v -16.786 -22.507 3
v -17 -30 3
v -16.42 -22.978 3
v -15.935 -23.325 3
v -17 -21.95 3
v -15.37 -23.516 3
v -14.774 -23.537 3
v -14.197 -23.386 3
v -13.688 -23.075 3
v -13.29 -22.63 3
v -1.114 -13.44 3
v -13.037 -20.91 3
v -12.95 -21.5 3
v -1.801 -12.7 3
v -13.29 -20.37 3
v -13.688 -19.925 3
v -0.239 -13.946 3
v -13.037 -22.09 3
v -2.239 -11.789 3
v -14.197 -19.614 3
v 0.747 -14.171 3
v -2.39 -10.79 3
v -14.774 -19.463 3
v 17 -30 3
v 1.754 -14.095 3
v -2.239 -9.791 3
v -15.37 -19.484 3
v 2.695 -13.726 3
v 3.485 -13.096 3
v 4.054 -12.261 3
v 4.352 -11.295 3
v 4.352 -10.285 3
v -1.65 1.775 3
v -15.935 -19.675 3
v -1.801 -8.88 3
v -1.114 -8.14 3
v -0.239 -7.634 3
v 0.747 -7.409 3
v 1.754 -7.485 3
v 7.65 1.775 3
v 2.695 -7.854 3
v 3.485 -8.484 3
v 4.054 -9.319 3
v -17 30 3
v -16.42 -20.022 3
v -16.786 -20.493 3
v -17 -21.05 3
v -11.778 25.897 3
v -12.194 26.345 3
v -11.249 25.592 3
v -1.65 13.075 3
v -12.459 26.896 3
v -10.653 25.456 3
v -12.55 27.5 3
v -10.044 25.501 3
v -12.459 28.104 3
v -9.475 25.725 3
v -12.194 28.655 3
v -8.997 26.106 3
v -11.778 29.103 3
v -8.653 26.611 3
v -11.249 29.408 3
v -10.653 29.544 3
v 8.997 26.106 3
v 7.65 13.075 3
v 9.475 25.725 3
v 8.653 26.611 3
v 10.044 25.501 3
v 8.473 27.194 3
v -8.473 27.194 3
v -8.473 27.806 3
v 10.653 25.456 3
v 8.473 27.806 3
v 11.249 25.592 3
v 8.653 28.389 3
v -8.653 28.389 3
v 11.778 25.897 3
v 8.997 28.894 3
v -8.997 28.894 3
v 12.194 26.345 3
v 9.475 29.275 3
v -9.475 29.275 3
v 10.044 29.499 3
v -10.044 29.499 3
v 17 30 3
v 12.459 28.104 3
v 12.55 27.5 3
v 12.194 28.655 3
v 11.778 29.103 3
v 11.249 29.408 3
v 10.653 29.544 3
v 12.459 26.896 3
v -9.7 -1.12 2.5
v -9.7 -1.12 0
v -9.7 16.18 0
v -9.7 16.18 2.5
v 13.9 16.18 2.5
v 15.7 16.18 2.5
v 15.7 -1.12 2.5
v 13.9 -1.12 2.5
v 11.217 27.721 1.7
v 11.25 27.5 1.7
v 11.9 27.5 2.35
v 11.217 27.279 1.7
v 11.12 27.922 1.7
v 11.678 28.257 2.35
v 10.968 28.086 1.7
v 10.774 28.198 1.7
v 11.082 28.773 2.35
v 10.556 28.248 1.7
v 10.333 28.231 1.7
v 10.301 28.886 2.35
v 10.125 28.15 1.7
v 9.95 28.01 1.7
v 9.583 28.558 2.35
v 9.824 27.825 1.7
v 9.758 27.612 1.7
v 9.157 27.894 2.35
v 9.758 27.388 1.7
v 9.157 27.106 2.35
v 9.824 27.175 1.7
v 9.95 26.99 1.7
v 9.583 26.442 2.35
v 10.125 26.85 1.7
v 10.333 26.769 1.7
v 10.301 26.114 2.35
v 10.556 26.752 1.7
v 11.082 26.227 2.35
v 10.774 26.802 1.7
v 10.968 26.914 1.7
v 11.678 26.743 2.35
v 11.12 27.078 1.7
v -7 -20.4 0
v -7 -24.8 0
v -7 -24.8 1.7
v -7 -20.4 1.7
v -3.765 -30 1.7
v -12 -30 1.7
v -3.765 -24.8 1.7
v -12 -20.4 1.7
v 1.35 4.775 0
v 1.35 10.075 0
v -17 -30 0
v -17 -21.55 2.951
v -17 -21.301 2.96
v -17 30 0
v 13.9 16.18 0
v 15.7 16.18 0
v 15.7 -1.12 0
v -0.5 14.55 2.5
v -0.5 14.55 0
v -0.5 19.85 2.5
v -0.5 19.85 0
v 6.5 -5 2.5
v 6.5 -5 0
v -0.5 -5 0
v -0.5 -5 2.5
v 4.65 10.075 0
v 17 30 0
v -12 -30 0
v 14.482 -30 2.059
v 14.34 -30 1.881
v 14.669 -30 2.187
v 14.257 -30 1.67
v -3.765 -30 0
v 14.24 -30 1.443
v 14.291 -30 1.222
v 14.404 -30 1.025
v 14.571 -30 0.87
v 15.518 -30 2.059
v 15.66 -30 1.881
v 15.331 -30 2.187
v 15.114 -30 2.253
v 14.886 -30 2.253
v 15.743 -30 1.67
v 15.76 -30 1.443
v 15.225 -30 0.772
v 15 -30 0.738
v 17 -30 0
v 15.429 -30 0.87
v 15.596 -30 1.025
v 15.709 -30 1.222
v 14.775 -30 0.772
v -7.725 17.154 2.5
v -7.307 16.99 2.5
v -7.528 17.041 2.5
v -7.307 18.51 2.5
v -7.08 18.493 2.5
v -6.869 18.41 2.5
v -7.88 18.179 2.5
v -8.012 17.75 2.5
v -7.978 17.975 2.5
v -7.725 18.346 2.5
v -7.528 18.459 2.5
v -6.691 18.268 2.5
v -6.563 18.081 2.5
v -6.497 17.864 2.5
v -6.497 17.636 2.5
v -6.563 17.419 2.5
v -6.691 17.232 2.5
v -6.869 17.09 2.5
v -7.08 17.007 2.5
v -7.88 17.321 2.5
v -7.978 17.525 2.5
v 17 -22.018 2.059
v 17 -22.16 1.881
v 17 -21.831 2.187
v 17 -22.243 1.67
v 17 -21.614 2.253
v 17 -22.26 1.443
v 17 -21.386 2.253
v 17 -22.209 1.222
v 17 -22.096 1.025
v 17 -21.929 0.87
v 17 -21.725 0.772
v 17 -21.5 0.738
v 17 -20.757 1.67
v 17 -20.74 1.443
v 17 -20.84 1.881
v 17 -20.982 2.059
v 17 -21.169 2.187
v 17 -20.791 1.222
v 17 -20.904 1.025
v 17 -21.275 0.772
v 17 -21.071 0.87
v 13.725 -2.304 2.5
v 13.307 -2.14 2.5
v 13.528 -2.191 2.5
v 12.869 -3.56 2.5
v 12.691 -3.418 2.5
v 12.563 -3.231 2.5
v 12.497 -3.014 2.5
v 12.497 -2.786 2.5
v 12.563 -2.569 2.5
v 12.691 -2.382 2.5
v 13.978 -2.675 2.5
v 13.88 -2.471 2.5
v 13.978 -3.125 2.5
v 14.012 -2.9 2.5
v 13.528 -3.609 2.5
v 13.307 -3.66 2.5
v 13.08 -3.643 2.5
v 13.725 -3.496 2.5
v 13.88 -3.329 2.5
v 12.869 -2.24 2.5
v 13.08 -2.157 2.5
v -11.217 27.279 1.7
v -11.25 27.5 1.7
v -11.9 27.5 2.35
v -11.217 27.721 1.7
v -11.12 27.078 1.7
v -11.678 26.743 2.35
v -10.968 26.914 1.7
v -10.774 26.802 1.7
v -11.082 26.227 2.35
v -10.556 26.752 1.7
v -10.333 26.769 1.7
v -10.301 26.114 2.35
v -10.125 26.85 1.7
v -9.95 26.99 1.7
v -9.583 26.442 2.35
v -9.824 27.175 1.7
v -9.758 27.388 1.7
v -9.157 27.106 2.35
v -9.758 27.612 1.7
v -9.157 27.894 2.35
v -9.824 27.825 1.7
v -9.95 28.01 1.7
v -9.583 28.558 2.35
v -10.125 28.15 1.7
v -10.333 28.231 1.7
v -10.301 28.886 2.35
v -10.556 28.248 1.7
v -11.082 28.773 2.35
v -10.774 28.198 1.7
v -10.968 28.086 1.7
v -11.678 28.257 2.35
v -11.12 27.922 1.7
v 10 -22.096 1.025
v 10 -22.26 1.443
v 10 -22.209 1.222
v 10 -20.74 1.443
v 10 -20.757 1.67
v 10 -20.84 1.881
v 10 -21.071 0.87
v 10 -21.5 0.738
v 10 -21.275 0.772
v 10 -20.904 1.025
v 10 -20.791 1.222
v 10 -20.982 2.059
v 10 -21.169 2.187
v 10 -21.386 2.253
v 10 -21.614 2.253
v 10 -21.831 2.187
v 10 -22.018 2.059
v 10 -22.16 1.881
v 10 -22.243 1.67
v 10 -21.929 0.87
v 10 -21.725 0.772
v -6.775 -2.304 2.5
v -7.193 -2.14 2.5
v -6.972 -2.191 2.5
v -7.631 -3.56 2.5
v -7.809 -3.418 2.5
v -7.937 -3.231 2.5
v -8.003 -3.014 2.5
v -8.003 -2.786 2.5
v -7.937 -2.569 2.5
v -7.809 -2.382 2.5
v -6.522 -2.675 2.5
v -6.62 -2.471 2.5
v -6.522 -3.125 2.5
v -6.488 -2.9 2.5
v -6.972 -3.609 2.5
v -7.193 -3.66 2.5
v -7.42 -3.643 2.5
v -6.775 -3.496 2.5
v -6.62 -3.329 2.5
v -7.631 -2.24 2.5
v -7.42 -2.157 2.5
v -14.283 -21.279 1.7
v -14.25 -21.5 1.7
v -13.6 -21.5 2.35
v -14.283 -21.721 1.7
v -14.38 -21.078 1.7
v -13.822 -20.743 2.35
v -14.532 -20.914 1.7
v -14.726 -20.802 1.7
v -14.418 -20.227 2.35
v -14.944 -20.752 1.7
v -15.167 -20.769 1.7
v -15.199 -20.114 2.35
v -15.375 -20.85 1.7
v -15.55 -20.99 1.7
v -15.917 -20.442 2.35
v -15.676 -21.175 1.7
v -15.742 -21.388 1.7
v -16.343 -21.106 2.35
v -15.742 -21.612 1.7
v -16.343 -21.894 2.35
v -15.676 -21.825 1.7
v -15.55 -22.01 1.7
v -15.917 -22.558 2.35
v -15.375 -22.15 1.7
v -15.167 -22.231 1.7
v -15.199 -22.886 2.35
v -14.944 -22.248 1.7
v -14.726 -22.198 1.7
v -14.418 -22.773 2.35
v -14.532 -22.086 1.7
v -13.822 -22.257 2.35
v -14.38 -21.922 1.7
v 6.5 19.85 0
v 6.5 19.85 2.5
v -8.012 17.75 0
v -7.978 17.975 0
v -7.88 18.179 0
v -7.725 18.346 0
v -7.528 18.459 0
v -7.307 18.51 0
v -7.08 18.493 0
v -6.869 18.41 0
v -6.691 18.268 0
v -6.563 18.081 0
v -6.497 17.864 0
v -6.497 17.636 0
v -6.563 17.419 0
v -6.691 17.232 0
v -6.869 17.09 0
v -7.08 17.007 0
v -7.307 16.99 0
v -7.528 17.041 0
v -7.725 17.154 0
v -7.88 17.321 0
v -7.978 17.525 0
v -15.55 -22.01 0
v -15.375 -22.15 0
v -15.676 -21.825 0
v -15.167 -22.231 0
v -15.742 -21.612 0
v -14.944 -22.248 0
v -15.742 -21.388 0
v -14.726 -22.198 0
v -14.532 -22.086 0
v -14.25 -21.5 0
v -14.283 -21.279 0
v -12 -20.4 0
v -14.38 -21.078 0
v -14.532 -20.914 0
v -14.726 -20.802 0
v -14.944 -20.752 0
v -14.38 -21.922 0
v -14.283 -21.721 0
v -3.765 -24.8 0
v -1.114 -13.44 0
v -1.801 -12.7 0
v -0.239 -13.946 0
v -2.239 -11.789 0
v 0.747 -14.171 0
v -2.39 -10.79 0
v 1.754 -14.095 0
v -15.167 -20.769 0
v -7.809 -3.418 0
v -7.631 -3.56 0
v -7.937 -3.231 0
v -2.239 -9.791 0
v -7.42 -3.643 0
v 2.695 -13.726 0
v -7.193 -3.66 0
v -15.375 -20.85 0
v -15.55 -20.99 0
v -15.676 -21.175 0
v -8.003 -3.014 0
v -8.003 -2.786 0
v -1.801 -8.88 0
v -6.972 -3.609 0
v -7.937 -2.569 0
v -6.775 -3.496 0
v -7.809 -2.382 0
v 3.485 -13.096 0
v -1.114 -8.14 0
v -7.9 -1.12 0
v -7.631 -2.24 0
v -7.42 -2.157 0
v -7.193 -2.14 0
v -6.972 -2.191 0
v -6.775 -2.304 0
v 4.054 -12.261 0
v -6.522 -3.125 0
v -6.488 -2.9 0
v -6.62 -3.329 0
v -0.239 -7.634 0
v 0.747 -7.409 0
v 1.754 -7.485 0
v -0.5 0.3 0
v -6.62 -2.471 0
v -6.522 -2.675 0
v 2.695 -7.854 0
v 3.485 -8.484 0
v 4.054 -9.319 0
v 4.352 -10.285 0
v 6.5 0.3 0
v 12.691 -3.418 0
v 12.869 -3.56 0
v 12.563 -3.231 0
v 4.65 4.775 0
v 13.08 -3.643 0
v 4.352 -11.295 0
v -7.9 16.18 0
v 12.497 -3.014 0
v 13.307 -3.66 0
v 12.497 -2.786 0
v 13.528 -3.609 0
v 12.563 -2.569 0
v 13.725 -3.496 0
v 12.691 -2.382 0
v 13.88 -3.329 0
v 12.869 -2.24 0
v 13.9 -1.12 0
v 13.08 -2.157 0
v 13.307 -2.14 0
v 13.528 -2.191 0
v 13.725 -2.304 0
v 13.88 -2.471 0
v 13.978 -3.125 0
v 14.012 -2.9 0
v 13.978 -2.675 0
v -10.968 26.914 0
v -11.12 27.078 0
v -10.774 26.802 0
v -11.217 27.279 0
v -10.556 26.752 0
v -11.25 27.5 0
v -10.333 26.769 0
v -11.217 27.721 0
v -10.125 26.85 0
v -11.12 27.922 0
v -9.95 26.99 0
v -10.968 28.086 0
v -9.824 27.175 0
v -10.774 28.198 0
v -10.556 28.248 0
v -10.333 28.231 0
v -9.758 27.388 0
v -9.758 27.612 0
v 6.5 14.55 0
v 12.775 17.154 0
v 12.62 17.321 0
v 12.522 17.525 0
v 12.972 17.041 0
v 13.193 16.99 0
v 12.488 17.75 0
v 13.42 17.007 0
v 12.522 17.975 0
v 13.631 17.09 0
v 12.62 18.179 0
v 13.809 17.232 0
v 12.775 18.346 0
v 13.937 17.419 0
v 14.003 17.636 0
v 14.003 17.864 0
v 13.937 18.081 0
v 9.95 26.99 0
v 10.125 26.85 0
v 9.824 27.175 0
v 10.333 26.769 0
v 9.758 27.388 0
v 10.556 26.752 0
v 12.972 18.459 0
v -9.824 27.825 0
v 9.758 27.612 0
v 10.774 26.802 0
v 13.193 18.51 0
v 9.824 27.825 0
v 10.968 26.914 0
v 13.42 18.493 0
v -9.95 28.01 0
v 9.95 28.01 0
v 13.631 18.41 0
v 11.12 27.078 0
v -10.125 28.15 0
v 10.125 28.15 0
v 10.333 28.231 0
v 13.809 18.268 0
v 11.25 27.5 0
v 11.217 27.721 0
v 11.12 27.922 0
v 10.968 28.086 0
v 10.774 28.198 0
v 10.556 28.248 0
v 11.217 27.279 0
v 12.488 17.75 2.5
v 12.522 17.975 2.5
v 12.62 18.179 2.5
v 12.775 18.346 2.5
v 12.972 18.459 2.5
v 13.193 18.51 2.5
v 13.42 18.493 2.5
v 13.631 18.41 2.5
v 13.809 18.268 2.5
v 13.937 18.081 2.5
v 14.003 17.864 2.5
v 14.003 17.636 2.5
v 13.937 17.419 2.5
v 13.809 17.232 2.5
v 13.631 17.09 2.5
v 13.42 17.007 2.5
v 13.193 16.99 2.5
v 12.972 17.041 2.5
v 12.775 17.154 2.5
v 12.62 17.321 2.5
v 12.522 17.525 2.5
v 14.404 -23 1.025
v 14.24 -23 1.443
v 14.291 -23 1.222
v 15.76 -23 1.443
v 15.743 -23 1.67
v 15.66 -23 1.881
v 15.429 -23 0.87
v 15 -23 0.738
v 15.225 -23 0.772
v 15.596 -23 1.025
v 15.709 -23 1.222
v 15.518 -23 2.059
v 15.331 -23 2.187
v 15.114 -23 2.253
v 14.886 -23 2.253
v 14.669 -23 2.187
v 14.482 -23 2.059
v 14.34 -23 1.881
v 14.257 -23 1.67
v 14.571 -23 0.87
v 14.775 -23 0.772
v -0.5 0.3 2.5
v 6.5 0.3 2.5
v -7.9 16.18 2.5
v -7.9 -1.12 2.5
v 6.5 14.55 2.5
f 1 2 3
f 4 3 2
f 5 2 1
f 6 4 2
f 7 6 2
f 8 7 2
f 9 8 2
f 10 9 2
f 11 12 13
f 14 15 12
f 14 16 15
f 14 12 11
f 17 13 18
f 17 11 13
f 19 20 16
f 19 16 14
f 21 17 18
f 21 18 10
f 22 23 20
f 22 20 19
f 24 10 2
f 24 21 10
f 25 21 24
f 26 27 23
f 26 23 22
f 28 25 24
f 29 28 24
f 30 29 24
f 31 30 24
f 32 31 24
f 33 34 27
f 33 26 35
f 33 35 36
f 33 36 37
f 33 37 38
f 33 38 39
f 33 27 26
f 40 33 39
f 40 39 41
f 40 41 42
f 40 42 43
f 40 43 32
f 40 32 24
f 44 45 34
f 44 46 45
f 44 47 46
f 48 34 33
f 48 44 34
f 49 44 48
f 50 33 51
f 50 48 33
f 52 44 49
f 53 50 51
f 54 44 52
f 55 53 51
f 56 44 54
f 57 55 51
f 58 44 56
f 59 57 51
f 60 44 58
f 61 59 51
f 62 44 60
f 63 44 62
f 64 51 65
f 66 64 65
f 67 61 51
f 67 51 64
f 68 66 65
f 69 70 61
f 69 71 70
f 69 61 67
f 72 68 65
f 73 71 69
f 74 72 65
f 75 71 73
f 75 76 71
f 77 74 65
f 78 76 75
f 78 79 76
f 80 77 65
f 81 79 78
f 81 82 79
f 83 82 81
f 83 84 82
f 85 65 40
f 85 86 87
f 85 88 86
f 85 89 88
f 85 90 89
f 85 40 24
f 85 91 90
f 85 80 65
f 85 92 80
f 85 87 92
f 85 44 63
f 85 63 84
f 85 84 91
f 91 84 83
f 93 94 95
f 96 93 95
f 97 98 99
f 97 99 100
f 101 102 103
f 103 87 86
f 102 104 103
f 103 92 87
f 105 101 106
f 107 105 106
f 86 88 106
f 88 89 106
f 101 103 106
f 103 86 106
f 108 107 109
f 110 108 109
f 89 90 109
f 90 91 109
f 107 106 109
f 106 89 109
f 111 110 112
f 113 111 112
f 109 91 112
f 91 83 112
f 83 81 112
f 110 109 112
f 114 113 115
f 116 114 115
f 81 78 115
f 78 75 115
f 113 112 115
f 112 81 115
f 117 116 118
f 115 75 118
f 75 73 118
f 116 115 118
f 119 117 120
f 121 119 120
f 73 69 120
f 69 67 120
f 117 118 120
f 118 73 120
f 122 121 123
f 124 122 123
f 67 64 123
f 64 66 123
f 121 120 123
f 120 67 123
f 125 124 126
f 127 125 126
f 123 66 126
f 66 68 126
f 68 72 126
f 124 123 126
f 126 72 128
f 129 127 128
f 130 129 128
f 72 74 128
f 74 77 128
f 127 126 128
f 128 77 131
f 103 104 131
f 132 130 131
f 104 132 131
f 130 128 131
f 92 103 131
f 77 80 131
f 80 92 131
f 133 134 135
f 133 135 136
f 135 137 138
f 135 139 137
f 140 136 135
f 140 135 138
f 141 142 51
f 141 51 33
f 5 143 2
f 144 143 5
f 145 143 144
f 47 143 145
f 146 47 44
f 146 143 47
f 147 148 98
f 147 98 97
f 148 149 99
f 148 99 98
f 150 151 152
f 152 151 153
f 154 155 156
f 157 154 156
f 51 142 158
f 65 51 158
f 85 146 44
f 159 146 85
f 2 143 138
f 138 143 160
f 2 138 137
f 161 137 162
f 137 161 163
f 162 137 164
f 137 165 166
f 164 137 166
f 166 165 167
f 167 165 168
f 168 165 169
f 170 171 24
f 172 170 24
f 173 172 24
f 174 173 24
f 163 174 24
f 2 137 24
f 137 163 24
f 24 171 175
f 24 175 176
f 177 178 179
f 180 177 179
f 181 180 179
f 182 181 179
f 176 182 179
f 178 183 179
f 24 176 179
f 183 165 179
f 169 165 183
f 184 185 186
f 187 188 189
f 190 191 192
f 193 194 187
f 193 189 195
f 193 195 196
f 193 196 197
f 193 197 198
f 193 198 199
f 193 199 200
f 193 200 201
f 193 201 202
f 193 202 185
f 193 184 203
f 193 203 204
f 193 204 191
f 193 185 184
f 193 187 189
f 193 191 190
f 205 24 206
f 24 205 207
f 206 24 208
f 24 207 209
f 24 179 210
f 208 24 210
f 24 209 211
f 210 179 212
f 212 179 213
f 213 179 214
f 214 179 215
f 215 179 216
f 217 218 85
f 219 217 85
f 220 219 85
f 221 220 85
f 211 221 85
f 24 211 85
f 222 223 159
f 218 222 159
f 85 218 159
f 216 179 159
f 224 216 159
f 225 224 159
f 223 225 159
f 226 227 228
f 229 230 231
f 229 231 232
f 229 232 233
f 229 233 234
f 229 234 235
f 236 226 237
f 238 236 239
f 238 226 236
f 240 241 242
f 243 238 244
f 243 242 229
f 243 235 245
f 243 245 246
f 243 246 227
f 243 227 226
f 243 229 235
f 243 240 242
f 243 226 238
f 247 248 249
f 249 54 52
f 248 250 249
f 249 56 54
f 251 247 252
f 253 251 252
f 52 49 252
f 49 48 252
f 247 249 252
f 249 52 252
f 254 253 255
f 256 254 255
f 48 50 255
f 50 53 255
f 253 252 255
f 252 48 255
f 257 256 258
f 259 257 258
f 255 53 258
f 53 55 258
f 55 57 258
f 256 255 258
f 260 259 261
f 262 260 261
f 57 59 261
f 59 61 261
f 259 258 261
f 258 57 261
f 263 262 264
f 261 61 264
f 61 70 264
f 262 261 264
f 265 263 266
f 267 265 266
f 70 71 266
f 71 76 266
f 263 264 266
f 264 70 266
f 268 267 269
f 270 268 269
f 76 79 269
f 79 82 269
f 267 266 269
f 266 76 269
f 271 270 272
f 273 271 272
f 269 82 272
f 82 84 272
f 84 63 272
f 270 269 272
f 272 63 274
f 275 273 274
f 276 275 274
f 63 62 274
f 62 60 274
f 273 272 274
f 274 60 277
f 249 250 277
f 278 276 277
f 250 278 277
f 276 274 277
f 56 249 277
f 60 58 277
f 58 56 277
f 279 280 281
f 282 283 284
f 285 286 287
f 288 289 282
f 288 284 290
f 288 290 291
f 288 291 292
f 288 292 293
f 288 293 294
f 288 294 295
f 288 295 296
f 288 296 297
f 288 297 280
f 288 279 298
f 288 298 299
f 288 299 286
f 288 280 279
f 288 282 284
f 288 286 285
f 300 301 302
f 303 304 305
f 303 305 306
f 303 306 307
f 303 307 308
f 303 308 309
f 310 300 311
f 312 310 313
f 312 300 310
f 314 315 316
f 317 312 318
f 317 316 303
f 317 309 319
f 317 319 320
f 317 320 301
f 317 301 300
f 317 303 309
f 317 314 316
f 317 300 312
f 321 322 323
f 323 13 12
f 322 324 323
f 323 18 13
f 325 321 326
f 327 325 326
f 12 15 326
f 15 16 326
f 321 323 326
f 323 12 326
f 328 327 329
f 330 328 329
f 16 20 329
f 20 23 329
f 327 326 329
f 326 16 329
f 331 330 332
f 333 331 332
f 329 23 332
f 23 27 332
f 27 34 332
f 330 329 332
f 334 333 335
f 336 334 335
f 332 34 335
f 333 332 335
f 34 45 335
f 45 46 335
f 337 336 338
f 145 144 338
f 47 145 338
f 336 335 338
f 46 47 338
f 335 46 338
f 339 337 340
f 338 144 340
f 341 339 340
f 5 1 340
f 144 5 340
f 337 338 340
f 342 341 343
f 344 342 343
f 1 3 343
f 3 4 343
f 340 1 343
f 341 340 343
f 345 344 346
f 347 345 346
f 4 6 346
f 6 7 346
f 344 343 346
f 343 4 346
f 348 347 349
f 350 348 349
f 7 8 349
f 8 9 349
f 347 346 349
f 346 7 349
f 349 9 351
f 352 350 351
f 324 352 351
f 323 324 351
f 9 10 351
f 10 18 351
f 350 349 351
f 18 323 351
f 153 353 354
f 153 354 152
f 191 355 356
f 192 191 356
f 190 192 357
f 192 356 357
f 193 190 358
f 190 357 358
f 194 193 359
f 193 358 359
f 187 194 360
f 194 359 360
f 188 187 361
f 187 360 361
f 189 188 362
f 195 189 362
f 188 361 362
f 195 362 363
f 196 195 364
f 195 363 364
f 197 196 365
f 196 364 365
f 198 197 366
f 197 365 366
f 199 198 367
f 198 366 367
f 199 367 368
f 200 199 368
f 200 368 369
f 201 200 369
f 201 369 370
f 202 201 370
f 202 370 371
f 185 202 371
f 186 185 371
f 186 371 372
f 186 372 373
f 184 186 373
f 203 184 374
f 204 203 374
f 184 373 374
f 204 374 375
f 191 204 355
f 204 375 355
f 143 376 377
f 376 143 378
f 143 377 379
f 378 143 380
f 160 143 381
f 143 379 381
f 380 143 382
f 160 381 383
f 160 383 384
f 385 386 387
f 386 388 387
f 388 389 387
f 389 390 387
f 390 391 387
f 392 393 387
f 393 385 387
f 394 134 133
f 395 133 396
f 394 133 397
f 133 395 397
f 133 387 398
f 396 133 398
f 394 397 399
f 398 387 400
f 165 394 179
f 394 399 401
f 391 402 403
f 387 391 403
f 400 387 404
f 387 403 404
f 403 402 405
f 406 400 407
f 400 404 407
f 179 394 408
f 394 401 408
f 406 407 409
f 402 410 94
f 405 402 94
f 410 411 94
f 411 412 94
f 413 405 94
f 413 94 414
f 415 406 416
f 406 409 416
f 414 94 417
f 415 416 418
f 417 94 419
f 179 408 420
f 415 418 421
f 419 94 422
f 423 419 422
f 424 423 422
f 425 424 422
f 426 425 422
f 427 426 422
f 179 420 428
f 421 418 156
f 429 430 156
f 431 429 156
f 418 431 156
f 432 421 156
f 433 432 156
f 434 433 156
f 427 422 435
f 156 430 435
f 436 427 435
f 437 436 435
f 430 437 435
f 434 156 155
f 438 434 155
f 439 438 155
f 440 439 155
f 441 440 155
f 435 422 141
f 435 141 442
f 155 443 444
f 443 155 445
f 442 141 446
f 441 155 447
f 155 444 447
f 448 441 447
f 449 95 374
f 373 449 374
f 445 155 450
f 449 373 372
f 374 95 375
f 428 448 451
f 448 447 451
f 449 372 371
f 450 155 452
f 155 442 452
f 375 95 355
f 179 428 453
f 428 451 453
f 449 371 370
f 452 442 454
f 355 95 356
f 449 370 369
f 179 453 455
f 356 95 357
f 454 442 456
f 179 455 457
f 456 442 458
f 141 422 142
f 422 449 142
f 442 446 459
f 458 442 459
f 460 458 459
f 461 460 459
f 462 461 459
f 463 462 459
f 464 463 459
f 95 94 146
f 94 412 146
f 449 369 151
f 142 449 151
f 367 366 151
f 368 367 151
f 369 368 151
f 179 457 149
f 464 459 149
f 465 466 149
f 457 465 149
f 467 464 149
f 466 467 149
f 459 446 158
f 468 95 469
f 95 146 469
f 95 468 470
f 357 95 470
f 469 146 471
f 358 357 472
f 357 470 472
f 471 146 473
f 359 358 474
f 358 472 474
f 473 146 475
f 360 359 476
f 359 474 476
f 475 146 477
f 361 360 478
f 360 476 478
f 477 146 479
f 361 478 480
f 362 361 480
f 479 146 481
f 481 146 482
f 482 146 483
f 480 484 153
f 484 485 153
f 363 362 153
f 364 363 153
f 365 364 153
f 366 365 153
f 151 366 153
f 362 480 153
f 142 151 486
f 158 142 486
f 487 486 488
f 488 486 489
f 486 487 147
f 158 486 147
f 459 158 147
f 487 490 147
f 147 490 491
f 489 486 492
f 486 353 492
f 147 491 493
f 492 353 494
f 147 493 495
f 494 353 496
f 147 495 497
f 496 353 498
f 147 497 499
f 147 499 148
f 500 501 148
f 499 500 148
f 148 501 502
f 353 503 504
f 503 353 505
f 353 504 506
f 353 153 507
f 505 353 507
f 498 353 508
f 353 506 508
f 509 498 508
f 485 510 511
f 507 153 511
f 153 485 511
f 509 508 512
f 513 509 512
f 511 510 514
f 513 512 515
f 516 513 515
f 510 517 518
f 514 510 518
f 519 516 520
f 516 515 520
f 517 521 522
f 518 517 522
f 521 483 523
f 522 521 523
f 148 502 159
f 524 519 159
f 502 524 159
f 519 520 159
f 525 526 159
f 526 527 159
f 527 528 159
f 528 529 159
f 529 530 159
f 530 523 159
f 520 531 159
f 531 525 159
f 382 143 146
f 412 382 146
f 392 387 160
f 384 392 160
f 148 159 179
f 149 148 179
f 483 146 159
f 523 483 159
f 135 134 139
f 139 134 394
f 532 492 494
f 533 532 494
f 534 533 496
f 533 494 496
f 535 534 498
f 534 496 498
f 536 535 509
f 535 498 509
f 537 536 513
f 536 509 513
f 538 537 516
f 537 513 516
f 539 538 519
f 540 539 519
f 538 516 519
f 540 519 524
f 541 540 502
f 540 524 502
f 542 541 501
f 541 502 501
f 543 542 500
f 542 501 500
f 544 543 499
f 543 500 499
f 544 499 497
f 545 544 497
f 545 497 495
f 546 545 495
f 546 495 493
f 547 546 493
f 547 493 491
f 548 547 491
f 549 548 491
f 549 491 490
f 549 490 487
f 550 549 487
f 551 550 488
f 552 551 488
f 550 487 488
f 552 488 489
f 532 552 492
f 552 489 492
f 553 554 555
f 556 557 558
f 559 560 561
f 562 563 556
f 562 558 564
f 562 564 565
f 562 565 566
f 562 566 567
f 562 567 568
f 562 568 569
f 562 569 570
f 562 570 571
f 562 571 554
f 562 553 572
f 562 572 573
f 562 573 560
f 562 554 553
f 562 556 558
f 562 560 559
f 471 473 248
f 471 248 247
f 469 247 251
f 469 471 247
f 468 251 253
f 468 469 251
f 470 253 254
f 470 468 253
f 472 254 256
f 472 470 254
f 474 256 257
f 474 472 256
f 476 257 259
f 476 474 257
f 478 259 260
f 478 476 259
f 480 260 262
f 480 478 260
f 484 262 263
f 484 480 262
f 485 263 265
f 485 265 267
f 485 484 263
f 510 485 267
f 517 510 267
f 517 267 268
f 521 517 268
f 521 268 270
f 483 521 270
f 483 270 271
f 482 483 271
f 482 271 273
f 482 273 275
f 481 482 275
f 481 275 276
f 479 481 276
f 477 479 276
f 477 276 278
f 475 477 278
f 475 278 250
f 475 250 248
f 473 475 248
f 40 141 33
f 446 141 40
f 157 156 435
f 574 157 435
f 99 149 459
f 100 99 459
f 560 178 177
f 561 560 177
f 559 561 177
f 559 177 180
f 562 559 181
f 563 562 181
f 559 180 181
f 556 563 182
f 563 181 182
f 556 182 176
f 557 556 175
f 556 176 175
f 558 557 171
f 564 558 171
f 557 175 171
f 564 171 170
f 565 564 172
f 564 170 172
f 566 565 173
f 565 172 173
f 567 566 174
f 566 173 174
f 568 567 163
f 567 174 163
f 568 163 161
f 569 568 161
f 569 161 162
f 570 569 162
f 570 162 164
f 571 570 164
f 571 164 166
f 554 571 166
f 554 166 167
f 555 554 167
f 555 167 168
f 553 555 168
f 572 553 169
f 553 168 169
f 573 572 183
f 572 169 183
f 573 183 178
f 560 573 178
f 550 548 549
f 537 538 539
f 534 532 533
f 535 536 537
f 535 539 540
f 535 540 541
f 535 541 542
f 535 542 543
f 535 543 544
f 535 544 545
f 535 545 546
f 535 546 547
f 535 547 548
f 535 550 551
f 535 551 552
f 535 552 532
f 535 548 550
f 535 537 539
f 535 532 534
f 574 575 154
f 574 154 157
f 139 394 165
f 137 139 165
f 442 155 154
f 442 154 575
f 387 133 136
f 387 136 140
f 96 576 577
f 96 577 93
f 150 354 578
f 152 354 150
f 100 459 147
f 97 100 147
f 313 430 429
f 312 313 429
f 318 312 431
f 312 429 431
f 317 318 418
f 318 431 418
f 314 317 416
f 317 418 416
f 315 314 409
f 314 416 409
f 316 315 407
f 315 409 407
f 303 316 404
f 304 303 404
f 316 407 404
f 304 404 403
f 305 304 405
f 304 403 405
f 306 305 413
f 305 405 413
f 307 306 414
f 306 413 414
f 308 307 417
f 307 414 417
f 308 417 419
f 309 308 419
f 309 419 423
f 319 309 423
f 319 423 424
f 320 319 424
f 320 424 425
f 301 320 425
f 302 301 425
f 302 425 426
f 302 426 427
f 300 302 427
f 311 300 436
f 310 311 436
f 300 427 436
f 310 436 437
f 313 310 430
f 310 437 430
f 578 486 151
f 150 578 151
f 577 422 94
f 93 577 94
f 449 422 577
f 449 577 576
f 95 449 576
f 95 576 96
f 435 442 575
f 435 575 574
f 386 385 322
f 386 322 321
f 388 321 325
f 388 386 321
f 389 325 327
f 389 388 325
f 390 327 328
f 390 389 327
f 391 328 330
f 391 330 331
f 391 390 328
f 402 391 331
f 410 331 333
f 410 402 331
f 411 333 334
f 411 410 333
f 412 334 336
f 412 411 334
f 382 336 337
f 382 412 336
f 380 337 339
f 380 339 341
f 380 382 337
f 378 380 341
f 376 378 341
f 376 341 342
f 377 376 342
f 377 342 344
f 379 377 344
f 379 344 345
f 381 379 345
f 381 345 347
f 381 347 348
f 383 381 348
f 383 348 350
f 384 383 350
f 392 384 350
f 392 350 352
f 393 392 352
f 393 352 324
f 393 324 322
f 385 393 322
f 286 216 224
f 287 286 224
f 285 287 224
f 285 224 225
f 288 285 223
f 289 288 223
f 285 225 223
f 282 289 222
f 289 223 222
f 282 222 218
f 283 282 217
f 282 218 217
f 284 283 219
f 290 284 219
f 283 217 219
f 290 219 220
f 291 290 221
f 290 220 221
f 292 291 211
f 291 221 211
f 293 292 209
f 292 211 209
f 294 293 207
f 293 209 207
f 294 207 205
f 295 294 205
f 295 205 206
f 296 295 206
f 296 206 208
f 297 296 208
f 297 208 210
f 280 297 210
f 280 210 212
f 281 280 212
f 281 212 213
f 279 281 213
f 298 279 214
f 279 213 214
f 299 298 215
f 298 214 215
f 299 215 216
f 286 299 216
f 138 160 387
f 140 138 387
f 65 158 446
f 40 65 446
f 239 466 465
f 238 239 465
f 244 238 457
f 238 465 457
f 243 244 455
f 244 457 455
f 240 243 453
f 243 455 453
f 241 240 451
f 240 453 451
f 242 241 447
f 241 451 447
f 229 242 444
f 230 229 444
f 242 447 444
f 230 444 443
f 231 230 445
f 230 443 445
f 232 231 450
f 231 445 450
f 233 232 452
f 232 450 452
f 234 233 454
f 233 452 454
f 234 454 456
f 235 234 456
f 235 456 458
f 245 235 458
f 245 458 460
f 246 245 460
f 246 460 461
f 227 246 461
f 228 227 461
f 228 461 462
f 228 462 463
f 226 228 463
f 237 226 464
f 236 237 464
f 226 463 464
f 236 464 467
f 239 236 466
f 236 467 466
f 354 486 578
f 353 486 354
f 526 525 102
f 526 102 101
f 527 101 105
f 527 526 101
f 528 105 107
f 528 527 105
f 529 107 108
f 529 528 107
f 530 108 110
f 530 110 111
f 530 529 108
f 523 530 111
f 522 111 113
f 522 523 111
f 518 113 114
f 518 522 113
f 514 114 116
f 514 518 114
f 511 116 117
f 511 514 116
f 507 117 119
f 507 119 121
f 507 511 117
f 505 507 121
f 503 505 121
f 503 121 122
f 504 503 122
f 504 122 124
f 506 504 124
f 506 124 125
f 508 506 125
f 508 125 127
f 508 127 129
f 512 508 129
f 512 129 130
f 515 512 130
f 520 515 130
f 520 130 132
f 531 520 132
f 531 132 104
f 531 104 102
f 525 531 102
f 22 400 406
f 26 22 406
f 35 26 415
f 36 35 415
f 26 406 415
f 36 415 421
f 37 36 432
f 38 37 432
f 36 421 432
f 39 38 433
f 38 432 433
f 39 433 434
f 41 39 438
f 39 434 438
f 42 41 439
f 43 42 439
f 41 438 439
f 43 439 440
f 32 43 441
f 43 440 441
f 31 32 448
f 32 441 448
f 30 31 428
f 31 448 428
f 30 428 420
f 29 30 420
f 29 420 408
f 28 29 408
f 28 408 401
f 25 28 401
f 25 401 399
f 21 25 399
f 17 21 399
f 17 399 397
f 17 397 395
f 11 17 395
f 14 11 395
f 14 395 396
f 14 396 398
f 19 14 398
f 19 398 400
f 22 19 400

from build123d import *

# Parameters (mm, degrees)
SKETCH1_W           = 34
SKETCH1_H           = 60
SKETCH1_R           = 0.75
BOSS_EXTRUDE1_DEPTH = 3
CHAMFER1_SIZE       = 1.3
SKETCH2_R           = 0.762
CUT_EXTRUDE1_DEPTH  = 7
SKETCH3_W           = 5
SKETCH3_H           = 4.4
CUT_EXTRUDE2_DEPTH  = 1.7
SKETCH4_R           = 0.762
CUT_EXTRUDE3_DEPTH  = 7
SKETCH5_W           = 3.3
SKETCH5_H           = 5.3
CUT_EXTRUDE4_DEPTH  = 3.5
SKETCH7_R           = 0.762
SKETCH7_W           = 7
SKETCH7_H           = 5.3
CUT_EXTRUDE5_DEPTH  = 2.5
SKETCH8_W           = 1.8
SKETCH8_H           = 17.3
CUT_EXTRUDE6_DEPTH  = 2.5
SKETCH9_R           = 3.39
CUT_EXTRUDE7_DEPTH  = 7.5
CHAMFER2_SIZE       = 3


# Some blends are built 0.0001 mm under size
with BuildPart() as part:
    # Sketch1 → Boss-Extrude1 (new body)
    with BuildSketch(Plane.XY):
        Rectangle(SKETCH1_W, SKETCH1_H)
        with Locations((-15, -21.5)):
            Circle(SKETCH1_R, mode=Mode.SUBTRACT)
        with Locations(Location((-10.5, 27.5, 0), (0, 0, 180))):
            Circle(SKETCH1_R, mode=Mode.SUBTRACT)
        with Locations((10.5, 27.5)):
            Circle(SKETCH1_R, mode=Mode.SUBTRACT)
    extrude(amount=BOSS_EXTRUDE1_DEPTH)

    # Chamfer1
    # the kernel refuses this chamfer: 1.3 mm, written as the material it takes off along each edge
    with BuildSketch(Plane(origin=(-15, -21.5, 3), x_dir=(1, 0, 0), z_dir=(0, -1, 0))) as chamfer1_piece_1:
        Polygon((0.75, -CHAMFER1_SIZE), (0.75 + CHAMFER1_SIZE, 0), (0.75, 0), align=None)
    revolve(axis=Axis((-15, -21.5, 3), (0, 0, 1)), mode=Mode.SUBTRACT)
    with BuildSketch(Plane(origin=(-10.5, 27.5, 3), x_dir=(-1, 0, 0), z_dir=(0, 1, 0))) as chamfer1_piece_2:
        Polygon((0.75, -CHAMFER1_SIZE), (0.75 + CHAMFER1_SIZE, 0), (0.75, 0), align=None)
    revolve(axis=Axis((-10.5, 27.5, 3), (0, 0, 1)), mode=Mode.SUBTRACT)
    with BuildSketch(Plane(origin=(10.5, 27.5, 3), x_dir=(1, 0, 0), z_dir=(0, -1, 0))) as chamfer1_piece_3:
        Polygon((0.75, -CHAMFER1_SIZE), (0.75 + CHAMFER1_SIZE, 0), (0.75, 0), align=None)
    revolve(axis=Axis((10.5, 27.5, 3), (0, 0, 1)), mode=Mode.SUBTRACT)

    # Sketch2 → Cut-Extrude1 (cut)
    with BuildSketch(Plane(origin=(17, 0, 0), x_dir=(0, 0, -1), z_dir=(1, 0, 0))):
        with Locations((-1.5, -21.5)):
            Circle(SKETCH2_R)
    extrude(amount=-CUT_EXTRUDE1_DEPTH, mode=Mode.SUBTRACT)

    # Sketch3 → Cut-Extrude2 (cut)
    with BuildSketch(Plane(origin=(0, 0, 0), x_dir=(-1, 0, 0), z_dir=(0, 0, -1))):
        Polygon((3.765333438, -30), (12, -30), (12, -24.8), (7, -24.8), (3.765333438, -24.8), align=None)
        with Locations((9.5, -22.6)):
            Rectangle(SKETCH3_W, SKETCH3_H)
    extrude(amount=-CUT_EXTRUDE2_DEPTH, mode=Mode.SUBTRACT)

    # Sketch4 → Cut-Extrude3 (cut)
    with BuildSketch(Plane.XZ.offset(30)):
        with Locations(Location((15, 1.5, 0), (0, 0, 270))):
            Circle(SKETCH4_R)
    extrude(amount=-CUT_EXTRUDE3_DEPTH, mode=Mode.SUBTRACT)

    # Sketch5 → Cut-Extrude4 (cut)
    with BuildSketch(Plane(origin=(0, 0, 0), x_dir=(-1, 0, 0), z_dir=(0, 0, -1))):
        with Locations((-3, 7.425)):
            Rectangle(SKETCH5_W, SKETCH5_H)
    extrude(amount=-CUT_EXTRUDE4_DEPTH, mode=Mode.SUBTRACT)

    # Sketch7 → Cut-Extrude5 (cut)
    with BuildSketch(Plane(origin=(0, 0, 0), x_dir=(-1, 0, 0), z_dir=(0, 0, -1))):
        with Locations((-13.25, 17.75)):
            Circle(SKETCH7_R)
        with Locations((7.25, 17.75)):
            Circle(SKETCH7_R)
        with Locations(Location((7.25, -2.9, 0), (0, 0, 180))):
            Circle(SKETCH7_R)
        with Locations(Location((-13.25, -2.9, 0), (0, 0, 180))):
            Circle(SKETCH7_R)
        with Locations((-3, 17.2)):
            Rectangle(SKETCH7_W, SKETCH7_H)
        with Locations((-3, -2.35)):
            Rectangle(SKETCH7_W, SKETCH7_H)
    extrude(amount=-CUT_EXTRUDE5_DEPTH, mode=Mode.SUBTRACT)

    # Sketch8 → Cut-Extrude6 (cut)
    with BuildSketch(Plane(origin=(0, 0, 0), x_dir=(-1, 0, 0), z_dir=(0, 0, -1))):
        with Locations((8.8, 7.53)):
            Rectangle(SKETCH8_W, SKETCH8_H)
        with Locations((-14.8, 7.53)):
            Rectangle(SKETCH8_W, SKETCH8_H)
    extrude(amount=-CUT_EXTRUDE6_DEPTH, mode=Mode.SUBTRACT)

    # Sketch9 → Cut-Extrude7 (cut)
    with BuildSketch(Plane(origin=(0, 0, 0), x_dir=(-1, 0, 0), z_dir=(0, 0, -1))):
        with Locations((-1, -10.79)):
            Circle(SKETCH9_R)
    extrude(amount=-CUT_EXTRUDE7_DEPTH, mode=Mode.SUBTRACT)

    # Chamfer2
    chamfer2_edges = [part.edges().sort_by_distance(p)[0] for p in [
        (4.65, 7.425, 3),
        (3, 4.775, 3),
        (1.35, 7.425, 3),
        (3, 10.075, 3),
    ]]
    chamfer(chamfer2_edges, length=CHAMFER2_SIZE - 0.0001)  # a hair under: the kernel refuses the full size


solid = part.part
